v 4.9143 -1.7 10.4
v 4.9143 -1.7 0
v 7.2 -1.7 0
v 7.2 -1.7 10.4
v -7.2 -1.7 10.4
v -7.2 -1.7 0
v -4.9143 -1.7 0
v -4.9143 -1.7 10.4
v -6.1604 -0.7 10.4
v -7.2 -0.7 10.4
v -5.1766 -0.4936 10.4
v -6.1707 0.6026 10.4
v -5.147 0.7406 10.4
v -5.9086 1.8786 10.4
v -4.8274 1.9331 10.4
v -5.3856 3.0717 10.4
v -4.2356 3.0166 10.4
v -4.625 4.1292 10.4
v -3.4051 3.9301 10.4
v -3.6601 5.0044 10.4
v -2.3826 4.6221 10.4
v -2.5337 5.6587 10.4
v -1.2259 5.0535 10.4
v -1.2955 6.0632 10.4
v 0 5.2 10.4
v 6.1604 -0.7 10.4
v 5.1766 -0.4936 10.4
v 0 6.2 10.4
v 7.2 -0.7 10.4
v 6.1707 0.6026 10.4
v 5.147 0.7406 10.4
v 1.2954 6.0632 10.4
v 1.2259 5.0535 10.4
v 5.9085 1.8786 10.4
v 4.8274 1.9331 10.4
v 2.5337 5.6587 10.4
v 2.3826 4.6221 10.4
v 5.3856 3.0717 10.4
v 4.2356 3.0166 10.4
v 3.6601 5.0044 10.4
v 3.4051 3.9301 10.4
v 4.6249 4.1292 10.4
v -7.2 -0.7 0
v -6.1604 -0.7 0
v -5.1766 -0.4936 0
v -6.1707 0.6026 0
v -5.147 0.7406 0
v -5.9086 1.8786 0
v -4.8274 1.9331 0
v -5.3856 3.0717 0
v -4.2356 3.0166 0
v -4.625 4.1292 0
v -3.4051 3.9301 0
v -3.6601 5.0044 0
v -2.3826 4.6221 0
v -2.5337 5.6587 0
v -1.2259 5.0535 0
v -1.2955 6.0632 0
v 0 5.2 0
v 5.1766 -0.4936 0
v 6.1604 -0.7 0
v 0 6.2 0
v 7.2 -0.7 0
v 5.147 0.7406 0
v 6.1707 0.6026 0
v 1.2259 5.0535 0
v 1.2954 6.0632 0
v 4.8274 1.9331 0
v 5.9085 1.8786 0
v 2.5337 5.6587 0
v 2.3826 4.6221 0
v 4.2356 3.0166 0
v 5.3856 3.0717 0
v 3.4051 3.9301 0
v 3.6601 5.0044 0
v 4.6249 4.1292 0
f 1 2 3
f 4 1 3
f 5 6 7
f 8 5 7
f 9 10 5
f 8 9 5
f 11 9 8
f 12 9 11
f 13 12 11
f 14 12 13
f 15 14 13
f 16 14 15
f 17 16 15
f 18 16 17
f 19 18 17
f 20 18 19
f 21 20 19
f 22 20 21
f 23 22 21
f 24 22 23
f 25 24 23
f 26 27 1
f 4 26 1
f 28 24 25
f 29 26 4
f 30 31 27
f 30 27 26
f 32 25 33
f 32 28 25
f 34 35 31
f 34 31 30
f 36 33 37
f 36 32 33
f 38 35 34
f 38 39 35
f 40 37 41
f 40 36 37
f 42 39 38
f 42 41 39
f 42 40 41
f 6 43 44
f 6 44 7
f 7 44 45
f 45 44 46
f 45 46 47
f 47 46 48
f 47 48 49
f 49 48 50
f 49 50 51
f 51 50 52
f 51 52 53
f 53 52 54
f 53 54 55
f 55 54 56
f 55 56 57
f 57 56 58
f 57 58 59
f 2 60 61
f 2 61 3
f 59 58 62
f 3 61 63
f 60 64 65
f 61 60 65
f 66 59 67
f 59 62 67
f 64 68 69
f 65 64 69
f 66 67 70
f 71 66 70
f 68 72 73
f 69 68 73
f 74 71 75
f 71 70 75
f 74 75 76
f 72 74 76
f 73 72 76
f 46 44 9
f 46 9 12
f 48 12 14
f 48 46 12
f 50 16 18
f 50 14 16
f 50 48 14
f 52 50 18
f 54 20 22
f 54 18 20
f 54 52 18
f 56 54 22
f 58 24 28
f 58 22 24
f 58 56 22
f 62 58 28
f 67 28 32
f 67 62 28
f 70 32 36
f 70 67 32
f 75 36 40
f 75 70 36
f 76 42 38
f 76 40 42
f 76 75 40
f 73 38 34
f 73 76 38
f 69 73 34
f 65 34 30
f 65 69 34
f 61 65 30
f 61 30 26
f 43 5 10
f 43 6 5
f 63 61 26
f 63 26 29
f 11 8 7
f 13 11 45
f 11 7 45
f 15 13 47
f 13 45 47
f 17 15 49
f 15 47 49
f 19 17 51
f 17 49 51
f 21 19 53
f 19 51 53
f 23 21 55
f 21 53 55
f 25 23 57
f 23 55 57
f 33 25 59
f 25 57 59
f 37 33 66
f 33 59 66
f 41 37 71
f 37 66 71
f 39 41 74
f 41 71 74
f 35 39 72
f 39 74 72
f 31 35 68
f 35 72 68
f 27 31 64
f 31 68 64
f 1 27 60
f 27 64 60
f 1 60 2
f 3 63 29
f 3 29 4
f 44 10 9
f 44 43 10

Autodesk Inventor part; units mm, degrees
ref_plane "YZ Plane" through (0, 0, 0) normal (1, 0, 0) x (0, 1, 0)
ref_plane "XZ Plane" through (0, 0, 0) normal (0, 1, 0) x (-1, 0, 0)
ref_plane "XY Plane" through (0, 0, 0) normal (0, 0, 1) x (1, 0, 0)
sketch "스케치1" plane through (0, 0, 0) normal (0, 0, 1) x (1, 0, 0)
  arc A0 (4.9143, -1.7) -> (-4.9143, -1.7) centre (0, 0) ccw
  line L0 (-7.2, -1.7) -> (-7.2, -0.7)
  line L1 (7.2, -0.7) -> (7.2, -1.7)
  arc A1 (5.9624, -1.7) -> (-6.1604, -0.7) centre (0, 0) ccw
  line L2 (-7.2, -1.7) -> (-4.9143, -1.7)
  line L3 (4.9143, -1.7) -> (7.2, -1.7)
  line L4 (-7.2, -0.7) -> (-5.1527, -0.7)
  line L5 (5.1527, -0.7) -> (7.2, -0.7)
  point P0 (0, -0.7)
  point P1 (6.1604, -0.7)
  dimension "d0" = 10.4
  dimension "d1" = 1
  dimension "d2" = 0.7
  dimension "d3" = 2
  dimension "d4" = 1
extrude "돌출1" add sketch "스케치1" along normal blind 10.4
properties part number "rotion_stopper"
